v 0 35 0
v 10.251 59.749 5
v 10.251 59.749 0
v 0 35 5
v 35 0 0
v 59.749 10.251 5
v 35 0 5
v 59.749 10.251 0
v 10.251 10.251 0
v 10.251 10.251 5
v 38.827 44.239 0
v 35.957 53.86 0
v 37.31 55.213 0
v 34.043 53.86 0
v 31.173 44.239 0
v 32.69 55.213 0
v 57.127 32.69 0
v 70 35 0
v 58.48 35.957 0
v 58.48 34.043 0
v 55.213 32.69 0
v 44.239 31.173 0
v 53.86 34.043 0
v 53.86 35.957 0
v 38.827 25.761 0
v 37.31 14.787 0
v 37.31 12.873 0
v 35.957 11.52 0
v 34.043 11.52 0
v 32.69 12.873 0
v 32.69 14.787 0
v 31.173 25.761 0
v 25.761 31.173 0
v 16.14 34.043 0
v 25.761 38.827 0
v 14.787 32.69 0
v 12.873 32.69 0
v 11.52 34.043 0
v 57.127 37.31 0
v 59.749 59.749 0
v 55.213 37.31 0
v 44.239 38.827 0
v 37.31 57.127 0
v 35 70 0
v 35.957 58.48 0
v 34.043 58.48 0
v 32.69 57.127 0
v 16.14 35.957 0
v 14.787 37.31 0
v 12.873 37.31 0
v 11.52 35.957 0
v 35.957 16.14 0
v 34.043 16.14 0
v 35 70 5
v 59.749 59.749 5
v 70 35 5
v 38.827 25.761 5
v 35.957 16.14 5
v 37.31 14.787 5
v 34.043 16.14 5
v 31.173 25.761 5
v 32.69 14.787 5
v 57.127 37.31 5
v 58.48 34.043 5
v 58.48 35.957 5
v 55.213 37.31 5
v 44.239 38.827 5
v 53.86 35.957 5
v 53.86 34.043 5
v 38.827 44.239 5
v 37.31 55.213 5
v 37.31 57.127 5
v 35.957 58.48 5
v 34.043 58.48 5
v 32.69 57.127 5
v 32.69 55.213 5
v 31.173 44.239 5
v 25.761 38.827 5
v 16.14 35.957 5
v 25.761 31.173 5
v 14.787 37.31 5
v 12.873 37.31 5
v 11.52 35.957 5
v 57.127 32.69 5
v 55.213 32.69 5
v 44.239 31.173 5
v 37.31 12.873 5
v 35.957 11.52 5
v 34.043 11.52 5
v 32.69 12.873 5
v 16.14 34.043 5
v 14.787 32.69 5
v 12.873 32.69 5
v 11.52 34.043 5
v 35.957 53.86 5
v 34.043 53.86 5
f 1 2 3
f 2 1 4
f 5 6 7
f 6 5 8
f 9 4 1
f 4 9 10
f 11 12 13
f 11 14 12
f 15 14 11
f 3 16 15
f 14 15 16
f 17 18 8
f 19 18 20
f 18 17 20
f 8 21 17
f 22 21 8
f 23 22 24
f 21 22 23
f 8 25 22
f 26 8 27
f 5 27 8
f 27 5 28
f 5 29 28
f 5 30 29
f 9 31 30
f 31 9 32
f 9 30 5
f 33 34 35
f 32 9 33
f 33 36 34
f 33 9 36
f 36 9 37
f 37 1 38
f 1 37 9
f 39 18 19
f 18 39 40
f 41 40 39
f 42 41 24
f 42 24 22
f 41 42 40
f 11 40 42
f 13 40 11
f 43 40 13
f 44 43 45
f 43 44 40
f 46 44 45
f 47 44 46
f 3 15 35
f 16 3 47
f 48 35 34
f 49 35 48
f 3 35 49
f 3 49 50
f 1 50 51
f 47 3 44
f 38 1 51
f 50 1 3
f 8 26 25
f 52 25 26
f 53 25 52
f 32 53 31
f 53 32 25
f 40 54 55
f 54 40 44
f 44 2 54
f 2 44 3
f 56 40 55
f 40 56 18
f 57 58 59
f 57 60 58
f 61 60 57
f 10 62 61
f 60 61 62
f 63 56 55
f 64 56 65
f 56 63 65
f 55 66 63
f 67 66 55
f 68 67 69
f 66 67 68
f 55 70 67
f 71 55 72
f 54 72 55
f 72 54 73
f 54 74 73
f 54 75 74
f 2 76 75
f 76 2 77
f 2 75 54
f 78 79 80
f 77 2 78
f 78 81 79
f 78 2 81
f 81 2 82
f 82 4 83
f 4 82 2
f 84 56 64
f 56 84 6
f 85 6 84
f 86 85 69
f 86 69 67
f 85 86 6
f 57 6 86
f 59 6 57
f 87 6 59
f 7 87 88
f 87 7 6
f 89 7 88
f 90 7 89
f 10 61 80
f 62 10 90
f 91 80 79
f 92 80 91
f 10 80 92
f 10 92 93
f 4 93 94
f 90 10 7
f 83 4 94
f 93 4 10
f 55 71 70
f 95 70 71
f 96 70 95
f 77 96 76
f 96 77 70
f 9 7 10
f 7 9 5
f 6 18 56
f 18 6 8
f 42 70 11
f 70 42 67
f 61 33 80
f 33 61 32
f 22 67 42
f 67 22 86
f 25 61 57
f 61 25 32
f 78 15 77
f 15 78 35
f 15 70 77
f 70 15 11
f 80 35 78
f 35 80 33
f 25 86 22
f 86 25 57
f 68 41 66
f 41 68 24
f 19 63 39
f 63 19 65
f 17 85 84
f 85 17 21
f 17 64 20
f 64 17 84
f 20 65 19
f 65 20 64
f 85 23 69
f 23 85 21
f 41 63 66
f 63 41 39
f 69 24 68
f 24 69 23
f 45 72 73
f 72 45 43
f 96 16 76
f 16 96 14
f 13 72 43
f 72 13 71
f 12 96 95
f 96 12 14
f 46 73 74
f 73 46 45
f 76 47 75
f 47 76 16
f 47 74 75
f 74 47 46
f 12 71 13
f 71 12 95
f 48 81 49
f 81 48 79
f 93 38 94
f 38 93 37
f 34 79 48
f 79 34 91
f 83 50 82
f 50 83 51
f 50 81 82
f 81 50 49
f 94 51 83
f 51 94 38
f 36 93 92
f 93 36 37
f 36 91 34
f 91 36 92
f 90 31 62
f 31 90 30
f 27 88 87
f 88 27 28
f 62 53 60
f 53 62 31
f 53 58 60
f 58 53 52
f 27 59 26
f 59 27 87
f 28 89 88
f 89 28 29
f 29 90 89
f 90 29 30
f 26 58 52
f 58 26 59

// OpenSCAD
$fn = 32;

// ----------------------------------------------------------------------
// Polygon plate: 8-gon R35, 4 bolt windows
// ----------------------------------------------------------------------

// --- parameters (mm) ---
sides = 8;                // number of polygon sides
plate_r = 35;             // circumscribed radius of the polygon
bore_r = 10;              // centre bore radius
bolts = 4;                // number of bolt windows
ring_r = 21.17;           // bolt-circle radius
bolt_r = 2.5;             // bolt window radius
plate_t = 5;              // plate thickness, Z (extrusion height)
fit_tol = 0.05;           // declared fit tolerance (prompt contract)
free_tol = 0.2;           // declared free tolerance (prompt contract)

plate_d = 2 * plate_r;  // circumscribed diameter
bore_d = 2 * bore_r;  // centre bore diameter
bolt_d = 2 * bolt_r;  // bolt window diameter
ring_d = 2 * ring_r;  // bolt-circle diameter

profile = [[70, 35], [59.749, 59.749], [35, 70], [10.251, 59.749], [0, 35], [10.251, 10.251], [35, 0], [59.749, 10.251]];  // primary outline, 8 points, counter clockwise
void_1 = [[44.239, 38.827], [38.827, 44.239], [31.173, 44.239], [25.761, 38.827], [25.761, 31.173], [31.173, 25.761], [38.827, 25.761], [44.239, 31.173]];  // centre bore, 8 points
void_2 = [[58.48, 35.957], [57.127, 37.31], [55.213, 37.31], [53.86, 35.957], [53.86, 34.043], [55.213, 32.69], [57.127, 32.69], [58.48, 34.043]];  // bolt window 1, 8 points
void_3 = [[37.31, 57.127], [35.957, 58.48], [34.043, 58.48], [32.69, 57.127], [32.69, 55.213], [34.043, 53.86], [35.957, 53.86], [37.31, 55.213]];  // bolt window 2, 8 points
void_4 = [[16.14, 35.957], [14.787, 37.31], [12.873, 37.31], [11.52, 35.957], [11.52, 34.043], [12.873, 32.69], [14.787, 32.69], [16.14, 34.043]];  // bolt window 3, 8 points
void_5 = [[37.31, 14.787], [35.957, 16.14], [34.043, 16.14], [32.69, 14.787], [32.69, 12.873], [34.043, 11.52], [35.957, 11.52], [37.31, 12.873]];  // bolt window 4, 8 points

// --- the one profile operation ---
difference() {
  linear_extrude(height = plate_t) polygon(points = profile);
  translate([0, 0, -1])
    linear_extrude(height = plate_t + 2) polygon(points = void_1);
  translate([0, 0, -1])
    linear_extrude(height = plate_t + 2) polygon(points = void_2);
  translate([0, 0, -1])
    linear_extrude(height = plate_t + 2) polygon(points = void_3);
  translate([0, 0, -1])
    linear_extrude(height = plate_t + 2) polygon(points = void_4);
  translate([0, 0, -1])
    linear_extrude(height = plate_t + 2) polygon(points = void_5);
}
